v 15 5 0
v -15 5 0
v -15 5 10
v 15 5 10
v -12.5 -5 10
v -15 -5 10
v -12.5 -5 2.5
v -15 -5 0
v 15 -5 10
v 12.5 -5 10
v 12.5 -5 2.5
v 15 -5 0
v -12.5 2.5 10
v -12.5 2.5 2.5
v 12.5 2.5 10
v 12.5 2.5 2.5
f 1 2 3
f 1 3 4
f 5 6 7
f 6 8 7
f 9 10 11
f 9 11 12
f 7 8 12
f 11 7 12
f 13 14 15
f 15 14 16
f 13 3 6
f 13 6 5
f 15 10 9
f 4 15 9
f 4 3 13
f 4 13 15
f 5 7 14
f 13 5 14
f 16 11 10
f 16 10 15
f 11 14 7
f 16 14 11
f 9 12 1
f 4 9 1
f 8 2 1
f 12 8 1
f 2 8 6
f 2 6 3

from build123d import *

# Parameters (mm, degrees)
F0_W     = 30
F0_H     = 10
F1_DEPTH = 10
F2_T     = -2.5


with BuildPart() as f1:
    # F0 (on Top) → F1 (new body)
    with BuildSketch(Plane.XY):
        Rectangle(F0_W, F0_H)
    extrude(amount=F1_DEPTH)

    # F2
    f2_openings = [f1.faces().sort_by_distance(p)[0] for p in [
        (0, 0, 10),
        (0, -5, 5),
    ]]
    offset(amount=F2_T, openings=f2_openings)


solid = f1.part
